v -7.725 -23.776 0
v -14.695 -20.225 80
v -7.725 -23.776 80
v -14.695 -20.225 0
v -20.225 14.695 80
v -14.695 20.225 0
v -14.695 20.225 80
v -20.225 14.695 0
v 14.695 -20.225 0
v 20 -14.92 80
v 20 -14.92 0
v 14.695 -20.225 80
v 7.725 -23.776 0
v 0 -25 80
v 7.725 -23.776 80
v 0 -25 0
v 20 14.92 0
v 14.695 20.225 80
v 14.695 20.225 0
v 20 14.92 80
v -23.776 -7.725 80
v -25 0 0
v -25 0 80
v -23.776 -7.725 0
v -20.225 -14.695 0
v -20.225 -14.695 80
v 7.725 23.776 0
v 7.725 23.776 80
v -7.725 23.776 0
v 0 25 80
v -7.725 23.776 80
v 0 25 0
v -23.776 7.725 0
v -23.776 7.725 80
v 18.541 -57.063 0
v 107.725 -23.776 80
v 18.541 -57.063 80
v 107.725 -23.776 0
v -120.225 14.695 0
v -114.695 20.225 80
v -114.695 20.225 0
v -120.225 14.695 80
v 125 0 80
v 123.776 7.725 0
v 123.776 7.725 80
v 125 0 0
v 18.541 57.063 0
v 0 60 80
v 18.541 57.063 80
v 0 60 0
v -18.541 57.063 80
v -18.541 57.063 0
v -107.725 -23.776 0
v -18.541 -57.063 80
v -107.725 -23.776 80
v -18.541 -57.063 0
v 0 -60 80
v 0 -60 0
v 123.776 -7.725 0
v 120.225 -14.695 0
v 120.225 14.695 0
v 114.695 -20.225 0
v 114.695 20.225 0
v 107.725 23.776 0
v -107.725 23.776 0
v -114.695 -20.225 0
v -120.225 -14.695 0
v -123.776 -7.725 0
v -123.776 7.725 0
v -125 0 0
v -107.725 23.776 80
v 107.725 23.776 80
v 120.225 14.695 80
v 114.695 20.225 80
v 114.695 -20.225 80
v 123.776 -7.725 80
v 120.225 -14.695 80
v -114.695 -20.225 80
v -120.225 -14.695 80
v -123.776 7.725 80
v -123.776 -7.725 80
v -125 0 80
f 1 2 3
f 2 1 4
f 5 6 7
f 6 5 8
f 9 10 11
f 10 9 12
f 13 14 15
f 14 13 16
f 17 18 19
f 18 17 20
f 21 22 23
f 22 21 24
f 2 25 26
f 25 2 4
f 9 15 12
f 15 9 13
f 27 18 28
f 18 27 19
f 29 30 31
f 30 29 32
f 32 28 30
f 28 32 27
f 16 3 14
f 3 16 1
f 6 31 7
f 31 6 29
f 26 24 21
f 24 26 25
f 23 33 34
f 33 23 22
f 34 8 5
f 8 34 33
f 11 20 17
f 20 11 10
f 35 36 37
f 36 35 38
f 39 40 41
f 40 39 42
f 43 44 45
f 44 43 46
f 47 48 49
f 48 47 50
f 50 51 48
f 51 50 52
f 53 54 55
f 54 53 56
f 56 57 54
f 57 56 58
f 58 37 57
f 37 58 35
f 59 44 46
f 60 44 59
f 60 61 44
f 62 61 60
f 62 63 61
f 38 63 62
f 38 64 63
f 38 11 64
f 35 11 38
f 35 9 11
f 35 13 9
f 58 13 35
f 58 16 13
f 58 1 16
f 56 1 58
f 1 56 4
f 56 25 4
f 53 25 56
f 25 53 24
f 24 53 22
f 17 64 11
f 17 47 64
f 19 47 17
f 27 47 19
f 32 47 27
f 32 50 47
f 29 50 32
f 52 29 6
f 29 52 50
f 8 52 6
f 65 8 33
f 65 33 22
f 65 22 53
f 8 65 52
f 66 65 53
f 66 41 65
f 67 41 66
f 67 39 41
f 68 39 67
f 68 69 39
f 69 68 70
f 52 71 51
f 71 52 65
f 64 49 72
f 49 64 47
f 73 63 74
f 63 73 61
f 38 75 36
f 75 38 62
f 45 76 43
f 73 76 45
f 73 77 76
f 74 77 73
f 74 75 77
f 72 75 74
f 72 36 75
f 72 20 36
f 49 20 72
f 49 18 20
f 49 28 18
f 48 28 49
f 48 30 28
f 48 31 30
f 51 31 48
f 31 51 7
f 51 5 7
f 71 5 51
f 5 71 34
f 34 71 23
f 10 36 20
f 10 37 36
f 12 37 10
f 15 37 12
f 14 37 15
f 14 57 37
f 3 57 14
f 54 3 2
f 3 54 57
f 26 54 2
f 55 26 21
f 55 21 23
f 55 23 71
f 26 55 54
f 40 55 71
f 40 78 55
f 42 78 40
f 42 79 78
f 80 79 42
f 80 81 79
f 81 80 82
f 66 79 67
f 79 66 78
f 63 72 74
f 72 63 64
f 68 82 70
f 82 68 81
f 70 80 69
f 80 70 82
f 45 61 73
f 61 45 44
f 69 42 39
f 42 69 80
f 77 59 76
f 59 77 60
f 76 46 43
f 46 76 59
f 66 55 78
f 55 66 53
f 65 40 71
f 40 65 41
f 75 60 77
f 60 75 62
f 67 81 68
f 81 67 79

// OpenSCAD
$fn=20;

nemaw = 42;
nemah = 30;
gap = 2;
boxw = 2.5;
nema_cylinder_r = 1.5;
nema_cylinder_h = 25;
mount_hole_r = 1.8;
mount_adjust = 20;
mount_hole_offset_x = 31/2;
mount_hole_offset_y = 31/2;
epsilon = 0.1;

module centeredCube(dimensions){
    translate([0, 0, dimensions[2]/2])
        cube(dimensions, center=true);
}

module ra_triangle(base, height){
    points = [[0, 0], [base, 0], [base, height]];
    
    polygon(points=points);
}

module nemaUmpiBase(h, pos=[0,0,0]){
    translate(pos)
        translate([0, 0, nemaw/2+gap+boxw])
            rotate([90, 0, 0])
                difference(){
                    centeredCube([nemaw+2*gap+boxw*2, nemaw+2*gap+boxw*2, h+2*gap+boxw]);
                    translate([0, 0, -epsilon]) centeredCube([nemaw+2*gap, nemaw+2*gap, h+2*gap]);
                    
                }
}

module nemaMount(h, pos=[0,0,0], adjust){
    function holePositionFromCenter() = [
        [-mount_hole_offset_x, -mount_hole_offset_y],
        [-mount_hole_offset_x, mount_hole_offset_y],
        [mount_hole_offset_x, mount_hole_offset_y],
        [mount_hole_offset_x, -mount_hole_offset_y]
    ];
    
    module allHoles(){
        // mount holes
        translate([0, epsilon, nemaw/2+boxw+gap]) rotate([90, 0, 0]) makeHoles(holePositionFromCenter(), mount_hole_r, boxw+1000, adjust);
        
        // center hole
        translate([0, epsilon, nemaw/2+boxw+gap]) rotate([90, 0, 0]) makeHoles([[0, 0]], mount_hole_r*2, boxw+1000, adjust);
    }
    
    module whatToDiff(){
        translate([-(nemaw+2*gap+2*boxw+adjust)/2-epsilon, -epsilon, 2*boxw+2*gap+nemaw+epsilon])
            rotate([-90, 0, -90])
                linear_extrude(2*boxw+2*gap+nemaw+2*epsilon+adjust)
                    ra_triangle(2*gap+boxw+nemah, nemah+2*boxw+gap);
        allHoles();
    }
    
    translate(pos){
        difference(){
            translate([0, 0, nemaw/2+gap+boxw])
                rotate([90, 0, 0])
                    difference(){
                        centeredCube([nemaw+2*gap+boxw*2+adjust, nemaw+2*gap+boxw*2, h+2*gap+boxw]);
                        translate([0, 0, boxw+gap+epsilon]) centeredCube([nemaw+2*gap+adjust, nemaw+2*gap, h+2*gap]);
                    }
                    
            whatToDiff();
        }
    }
}

module nema(h, pos=[0,0,0]){
    if(0){
        
    color([1, 0, 0])
    
    #translate(pos){
        rotate([90, 0, 0]){
            centeredCube([nemaw, nemaw, h]);
            translate([0, 0, -nema_cylinder_h]) cylinder(r=nema_cylinder_r, h=nema_cylinder_h);
        }
    }
    
} 
}

module nemaWithUmpiBase(pos){
    union(){
        nemaUmpiBase(nemah, pos);
        translate([0, 0, nemaw/2+gap+boxw]) nema(nemah, pos);
    }
}

module makeHoles(positions, r, h, adjust = 1){
    union(){
        for (i = [0 : 1 : len(positions)-1]) {
            translate(positions[i])
            hull(){
                translate([-adjust/2, 0, 0]) cylinder(r=r, h=h);
                translate([adjust/2, 0, 0]) cylinder(r=r, h=h);
            }
        }
    }
}

module nemaWithMount(pos, adjust){
    difference(){
        union(){
            nemaMount(nemah, pos, adjust=adjust);
            translate([0, -(gap*2+boxw), nemaw/2+gap+boxw]) nema(nemah, pos);
            
        }
    }
}
    
base_h = 5;

module base(){
    centeredCube([200, 300, base_h]);
}

module flatGearHead(h=50, gap = 0.0){
	difference(){
		cylinder(r=50/2+gap, h=h);
		translate([20+gap, -40, -20]) cube([45, 150, h+40]);
	}
}

module armbase(l, w, h){
	linear_extrude(h){
		hull(){
			translate([w/2, 0, 0]) circle(r=w/2);
			translate([l-w/2, 0, 0]) circle(r=w/2);
		}
	}
}

module hole(h=50, r=1.9){
	cylinder(r=r, h=h);
}

module armPiece(l=1700, w=250, h=40){
    scale([1, 1, 1] * 0.1)
	difference(){
		armbase(l, w, h);
     
        hull() gearMount([w*0.7, 0, -1], h=h+2.0);
        hull() gearMount([l-w*0.7, 0, -0.1], h=h+2.0);
//		translate([w/2, 0, -1]) flatGearHead(h=h+5, gap=2.3);
//		translate([l-w/2, 0, -1]) flatGearHead(h=h+5, gap=2.3);
	}
}

module wholeBase(){
    difference(){
        union(){
            base();
            translate([0, nemaw/2+gap+boxw, 0]) rotate([90, 0, 0]) nemaWithUmpiBase([0, 0, 0]);
            nemaWithMount([0, -50, 0], adjust=mount_adjust);
            translate([0, 0, 0]) rotate([0, 0, 180]) nemaWithMount([0, 0, 0], adjust=mount_adjust);
        }
    }
    //rotate([90, -90, 0]) armPiece();
}
    

module joint1(){
    intersection(){
        rotate([90, -90, 0]) armPiece(1400, 300, boxw*10.1); 
        translate([0, 0, nemah+boxw*2+gap*2+505]) cube([1000, 1000, 1000], center=true);
    }
    intersection(){
        translate([0, 0, -60]) rotate([90, -90, 0]) armPiece(2000, 300, boxw*20); 
        translate([0, 0, nemah+boxw*2+gap*2-536.5]) cube([1000, 1000, 1000], center=true);
    }
    nemaWithMount([0, 0, 0], adjust=mount_adjust);
}

module gearMount(pos, h=20){
    translate(pos)
        difference(){
            gearMountHull(h);
            translate([0, 0, -0.1])
                flatGearHead(h=h+2);
        }
}

module gearMountHull(h){
    hull(){
        translate([-100, 0, 0]) cylinder(r=25, h=h);
        translate([0, 0, 0]) cylinder(r=60, h=h);
        translate([100, 0, 0]) cylinder(r=25, h=h);
    }
}

gearMount([0, 0, 0], h=80);
//wholeBase();
//joint1(); 
